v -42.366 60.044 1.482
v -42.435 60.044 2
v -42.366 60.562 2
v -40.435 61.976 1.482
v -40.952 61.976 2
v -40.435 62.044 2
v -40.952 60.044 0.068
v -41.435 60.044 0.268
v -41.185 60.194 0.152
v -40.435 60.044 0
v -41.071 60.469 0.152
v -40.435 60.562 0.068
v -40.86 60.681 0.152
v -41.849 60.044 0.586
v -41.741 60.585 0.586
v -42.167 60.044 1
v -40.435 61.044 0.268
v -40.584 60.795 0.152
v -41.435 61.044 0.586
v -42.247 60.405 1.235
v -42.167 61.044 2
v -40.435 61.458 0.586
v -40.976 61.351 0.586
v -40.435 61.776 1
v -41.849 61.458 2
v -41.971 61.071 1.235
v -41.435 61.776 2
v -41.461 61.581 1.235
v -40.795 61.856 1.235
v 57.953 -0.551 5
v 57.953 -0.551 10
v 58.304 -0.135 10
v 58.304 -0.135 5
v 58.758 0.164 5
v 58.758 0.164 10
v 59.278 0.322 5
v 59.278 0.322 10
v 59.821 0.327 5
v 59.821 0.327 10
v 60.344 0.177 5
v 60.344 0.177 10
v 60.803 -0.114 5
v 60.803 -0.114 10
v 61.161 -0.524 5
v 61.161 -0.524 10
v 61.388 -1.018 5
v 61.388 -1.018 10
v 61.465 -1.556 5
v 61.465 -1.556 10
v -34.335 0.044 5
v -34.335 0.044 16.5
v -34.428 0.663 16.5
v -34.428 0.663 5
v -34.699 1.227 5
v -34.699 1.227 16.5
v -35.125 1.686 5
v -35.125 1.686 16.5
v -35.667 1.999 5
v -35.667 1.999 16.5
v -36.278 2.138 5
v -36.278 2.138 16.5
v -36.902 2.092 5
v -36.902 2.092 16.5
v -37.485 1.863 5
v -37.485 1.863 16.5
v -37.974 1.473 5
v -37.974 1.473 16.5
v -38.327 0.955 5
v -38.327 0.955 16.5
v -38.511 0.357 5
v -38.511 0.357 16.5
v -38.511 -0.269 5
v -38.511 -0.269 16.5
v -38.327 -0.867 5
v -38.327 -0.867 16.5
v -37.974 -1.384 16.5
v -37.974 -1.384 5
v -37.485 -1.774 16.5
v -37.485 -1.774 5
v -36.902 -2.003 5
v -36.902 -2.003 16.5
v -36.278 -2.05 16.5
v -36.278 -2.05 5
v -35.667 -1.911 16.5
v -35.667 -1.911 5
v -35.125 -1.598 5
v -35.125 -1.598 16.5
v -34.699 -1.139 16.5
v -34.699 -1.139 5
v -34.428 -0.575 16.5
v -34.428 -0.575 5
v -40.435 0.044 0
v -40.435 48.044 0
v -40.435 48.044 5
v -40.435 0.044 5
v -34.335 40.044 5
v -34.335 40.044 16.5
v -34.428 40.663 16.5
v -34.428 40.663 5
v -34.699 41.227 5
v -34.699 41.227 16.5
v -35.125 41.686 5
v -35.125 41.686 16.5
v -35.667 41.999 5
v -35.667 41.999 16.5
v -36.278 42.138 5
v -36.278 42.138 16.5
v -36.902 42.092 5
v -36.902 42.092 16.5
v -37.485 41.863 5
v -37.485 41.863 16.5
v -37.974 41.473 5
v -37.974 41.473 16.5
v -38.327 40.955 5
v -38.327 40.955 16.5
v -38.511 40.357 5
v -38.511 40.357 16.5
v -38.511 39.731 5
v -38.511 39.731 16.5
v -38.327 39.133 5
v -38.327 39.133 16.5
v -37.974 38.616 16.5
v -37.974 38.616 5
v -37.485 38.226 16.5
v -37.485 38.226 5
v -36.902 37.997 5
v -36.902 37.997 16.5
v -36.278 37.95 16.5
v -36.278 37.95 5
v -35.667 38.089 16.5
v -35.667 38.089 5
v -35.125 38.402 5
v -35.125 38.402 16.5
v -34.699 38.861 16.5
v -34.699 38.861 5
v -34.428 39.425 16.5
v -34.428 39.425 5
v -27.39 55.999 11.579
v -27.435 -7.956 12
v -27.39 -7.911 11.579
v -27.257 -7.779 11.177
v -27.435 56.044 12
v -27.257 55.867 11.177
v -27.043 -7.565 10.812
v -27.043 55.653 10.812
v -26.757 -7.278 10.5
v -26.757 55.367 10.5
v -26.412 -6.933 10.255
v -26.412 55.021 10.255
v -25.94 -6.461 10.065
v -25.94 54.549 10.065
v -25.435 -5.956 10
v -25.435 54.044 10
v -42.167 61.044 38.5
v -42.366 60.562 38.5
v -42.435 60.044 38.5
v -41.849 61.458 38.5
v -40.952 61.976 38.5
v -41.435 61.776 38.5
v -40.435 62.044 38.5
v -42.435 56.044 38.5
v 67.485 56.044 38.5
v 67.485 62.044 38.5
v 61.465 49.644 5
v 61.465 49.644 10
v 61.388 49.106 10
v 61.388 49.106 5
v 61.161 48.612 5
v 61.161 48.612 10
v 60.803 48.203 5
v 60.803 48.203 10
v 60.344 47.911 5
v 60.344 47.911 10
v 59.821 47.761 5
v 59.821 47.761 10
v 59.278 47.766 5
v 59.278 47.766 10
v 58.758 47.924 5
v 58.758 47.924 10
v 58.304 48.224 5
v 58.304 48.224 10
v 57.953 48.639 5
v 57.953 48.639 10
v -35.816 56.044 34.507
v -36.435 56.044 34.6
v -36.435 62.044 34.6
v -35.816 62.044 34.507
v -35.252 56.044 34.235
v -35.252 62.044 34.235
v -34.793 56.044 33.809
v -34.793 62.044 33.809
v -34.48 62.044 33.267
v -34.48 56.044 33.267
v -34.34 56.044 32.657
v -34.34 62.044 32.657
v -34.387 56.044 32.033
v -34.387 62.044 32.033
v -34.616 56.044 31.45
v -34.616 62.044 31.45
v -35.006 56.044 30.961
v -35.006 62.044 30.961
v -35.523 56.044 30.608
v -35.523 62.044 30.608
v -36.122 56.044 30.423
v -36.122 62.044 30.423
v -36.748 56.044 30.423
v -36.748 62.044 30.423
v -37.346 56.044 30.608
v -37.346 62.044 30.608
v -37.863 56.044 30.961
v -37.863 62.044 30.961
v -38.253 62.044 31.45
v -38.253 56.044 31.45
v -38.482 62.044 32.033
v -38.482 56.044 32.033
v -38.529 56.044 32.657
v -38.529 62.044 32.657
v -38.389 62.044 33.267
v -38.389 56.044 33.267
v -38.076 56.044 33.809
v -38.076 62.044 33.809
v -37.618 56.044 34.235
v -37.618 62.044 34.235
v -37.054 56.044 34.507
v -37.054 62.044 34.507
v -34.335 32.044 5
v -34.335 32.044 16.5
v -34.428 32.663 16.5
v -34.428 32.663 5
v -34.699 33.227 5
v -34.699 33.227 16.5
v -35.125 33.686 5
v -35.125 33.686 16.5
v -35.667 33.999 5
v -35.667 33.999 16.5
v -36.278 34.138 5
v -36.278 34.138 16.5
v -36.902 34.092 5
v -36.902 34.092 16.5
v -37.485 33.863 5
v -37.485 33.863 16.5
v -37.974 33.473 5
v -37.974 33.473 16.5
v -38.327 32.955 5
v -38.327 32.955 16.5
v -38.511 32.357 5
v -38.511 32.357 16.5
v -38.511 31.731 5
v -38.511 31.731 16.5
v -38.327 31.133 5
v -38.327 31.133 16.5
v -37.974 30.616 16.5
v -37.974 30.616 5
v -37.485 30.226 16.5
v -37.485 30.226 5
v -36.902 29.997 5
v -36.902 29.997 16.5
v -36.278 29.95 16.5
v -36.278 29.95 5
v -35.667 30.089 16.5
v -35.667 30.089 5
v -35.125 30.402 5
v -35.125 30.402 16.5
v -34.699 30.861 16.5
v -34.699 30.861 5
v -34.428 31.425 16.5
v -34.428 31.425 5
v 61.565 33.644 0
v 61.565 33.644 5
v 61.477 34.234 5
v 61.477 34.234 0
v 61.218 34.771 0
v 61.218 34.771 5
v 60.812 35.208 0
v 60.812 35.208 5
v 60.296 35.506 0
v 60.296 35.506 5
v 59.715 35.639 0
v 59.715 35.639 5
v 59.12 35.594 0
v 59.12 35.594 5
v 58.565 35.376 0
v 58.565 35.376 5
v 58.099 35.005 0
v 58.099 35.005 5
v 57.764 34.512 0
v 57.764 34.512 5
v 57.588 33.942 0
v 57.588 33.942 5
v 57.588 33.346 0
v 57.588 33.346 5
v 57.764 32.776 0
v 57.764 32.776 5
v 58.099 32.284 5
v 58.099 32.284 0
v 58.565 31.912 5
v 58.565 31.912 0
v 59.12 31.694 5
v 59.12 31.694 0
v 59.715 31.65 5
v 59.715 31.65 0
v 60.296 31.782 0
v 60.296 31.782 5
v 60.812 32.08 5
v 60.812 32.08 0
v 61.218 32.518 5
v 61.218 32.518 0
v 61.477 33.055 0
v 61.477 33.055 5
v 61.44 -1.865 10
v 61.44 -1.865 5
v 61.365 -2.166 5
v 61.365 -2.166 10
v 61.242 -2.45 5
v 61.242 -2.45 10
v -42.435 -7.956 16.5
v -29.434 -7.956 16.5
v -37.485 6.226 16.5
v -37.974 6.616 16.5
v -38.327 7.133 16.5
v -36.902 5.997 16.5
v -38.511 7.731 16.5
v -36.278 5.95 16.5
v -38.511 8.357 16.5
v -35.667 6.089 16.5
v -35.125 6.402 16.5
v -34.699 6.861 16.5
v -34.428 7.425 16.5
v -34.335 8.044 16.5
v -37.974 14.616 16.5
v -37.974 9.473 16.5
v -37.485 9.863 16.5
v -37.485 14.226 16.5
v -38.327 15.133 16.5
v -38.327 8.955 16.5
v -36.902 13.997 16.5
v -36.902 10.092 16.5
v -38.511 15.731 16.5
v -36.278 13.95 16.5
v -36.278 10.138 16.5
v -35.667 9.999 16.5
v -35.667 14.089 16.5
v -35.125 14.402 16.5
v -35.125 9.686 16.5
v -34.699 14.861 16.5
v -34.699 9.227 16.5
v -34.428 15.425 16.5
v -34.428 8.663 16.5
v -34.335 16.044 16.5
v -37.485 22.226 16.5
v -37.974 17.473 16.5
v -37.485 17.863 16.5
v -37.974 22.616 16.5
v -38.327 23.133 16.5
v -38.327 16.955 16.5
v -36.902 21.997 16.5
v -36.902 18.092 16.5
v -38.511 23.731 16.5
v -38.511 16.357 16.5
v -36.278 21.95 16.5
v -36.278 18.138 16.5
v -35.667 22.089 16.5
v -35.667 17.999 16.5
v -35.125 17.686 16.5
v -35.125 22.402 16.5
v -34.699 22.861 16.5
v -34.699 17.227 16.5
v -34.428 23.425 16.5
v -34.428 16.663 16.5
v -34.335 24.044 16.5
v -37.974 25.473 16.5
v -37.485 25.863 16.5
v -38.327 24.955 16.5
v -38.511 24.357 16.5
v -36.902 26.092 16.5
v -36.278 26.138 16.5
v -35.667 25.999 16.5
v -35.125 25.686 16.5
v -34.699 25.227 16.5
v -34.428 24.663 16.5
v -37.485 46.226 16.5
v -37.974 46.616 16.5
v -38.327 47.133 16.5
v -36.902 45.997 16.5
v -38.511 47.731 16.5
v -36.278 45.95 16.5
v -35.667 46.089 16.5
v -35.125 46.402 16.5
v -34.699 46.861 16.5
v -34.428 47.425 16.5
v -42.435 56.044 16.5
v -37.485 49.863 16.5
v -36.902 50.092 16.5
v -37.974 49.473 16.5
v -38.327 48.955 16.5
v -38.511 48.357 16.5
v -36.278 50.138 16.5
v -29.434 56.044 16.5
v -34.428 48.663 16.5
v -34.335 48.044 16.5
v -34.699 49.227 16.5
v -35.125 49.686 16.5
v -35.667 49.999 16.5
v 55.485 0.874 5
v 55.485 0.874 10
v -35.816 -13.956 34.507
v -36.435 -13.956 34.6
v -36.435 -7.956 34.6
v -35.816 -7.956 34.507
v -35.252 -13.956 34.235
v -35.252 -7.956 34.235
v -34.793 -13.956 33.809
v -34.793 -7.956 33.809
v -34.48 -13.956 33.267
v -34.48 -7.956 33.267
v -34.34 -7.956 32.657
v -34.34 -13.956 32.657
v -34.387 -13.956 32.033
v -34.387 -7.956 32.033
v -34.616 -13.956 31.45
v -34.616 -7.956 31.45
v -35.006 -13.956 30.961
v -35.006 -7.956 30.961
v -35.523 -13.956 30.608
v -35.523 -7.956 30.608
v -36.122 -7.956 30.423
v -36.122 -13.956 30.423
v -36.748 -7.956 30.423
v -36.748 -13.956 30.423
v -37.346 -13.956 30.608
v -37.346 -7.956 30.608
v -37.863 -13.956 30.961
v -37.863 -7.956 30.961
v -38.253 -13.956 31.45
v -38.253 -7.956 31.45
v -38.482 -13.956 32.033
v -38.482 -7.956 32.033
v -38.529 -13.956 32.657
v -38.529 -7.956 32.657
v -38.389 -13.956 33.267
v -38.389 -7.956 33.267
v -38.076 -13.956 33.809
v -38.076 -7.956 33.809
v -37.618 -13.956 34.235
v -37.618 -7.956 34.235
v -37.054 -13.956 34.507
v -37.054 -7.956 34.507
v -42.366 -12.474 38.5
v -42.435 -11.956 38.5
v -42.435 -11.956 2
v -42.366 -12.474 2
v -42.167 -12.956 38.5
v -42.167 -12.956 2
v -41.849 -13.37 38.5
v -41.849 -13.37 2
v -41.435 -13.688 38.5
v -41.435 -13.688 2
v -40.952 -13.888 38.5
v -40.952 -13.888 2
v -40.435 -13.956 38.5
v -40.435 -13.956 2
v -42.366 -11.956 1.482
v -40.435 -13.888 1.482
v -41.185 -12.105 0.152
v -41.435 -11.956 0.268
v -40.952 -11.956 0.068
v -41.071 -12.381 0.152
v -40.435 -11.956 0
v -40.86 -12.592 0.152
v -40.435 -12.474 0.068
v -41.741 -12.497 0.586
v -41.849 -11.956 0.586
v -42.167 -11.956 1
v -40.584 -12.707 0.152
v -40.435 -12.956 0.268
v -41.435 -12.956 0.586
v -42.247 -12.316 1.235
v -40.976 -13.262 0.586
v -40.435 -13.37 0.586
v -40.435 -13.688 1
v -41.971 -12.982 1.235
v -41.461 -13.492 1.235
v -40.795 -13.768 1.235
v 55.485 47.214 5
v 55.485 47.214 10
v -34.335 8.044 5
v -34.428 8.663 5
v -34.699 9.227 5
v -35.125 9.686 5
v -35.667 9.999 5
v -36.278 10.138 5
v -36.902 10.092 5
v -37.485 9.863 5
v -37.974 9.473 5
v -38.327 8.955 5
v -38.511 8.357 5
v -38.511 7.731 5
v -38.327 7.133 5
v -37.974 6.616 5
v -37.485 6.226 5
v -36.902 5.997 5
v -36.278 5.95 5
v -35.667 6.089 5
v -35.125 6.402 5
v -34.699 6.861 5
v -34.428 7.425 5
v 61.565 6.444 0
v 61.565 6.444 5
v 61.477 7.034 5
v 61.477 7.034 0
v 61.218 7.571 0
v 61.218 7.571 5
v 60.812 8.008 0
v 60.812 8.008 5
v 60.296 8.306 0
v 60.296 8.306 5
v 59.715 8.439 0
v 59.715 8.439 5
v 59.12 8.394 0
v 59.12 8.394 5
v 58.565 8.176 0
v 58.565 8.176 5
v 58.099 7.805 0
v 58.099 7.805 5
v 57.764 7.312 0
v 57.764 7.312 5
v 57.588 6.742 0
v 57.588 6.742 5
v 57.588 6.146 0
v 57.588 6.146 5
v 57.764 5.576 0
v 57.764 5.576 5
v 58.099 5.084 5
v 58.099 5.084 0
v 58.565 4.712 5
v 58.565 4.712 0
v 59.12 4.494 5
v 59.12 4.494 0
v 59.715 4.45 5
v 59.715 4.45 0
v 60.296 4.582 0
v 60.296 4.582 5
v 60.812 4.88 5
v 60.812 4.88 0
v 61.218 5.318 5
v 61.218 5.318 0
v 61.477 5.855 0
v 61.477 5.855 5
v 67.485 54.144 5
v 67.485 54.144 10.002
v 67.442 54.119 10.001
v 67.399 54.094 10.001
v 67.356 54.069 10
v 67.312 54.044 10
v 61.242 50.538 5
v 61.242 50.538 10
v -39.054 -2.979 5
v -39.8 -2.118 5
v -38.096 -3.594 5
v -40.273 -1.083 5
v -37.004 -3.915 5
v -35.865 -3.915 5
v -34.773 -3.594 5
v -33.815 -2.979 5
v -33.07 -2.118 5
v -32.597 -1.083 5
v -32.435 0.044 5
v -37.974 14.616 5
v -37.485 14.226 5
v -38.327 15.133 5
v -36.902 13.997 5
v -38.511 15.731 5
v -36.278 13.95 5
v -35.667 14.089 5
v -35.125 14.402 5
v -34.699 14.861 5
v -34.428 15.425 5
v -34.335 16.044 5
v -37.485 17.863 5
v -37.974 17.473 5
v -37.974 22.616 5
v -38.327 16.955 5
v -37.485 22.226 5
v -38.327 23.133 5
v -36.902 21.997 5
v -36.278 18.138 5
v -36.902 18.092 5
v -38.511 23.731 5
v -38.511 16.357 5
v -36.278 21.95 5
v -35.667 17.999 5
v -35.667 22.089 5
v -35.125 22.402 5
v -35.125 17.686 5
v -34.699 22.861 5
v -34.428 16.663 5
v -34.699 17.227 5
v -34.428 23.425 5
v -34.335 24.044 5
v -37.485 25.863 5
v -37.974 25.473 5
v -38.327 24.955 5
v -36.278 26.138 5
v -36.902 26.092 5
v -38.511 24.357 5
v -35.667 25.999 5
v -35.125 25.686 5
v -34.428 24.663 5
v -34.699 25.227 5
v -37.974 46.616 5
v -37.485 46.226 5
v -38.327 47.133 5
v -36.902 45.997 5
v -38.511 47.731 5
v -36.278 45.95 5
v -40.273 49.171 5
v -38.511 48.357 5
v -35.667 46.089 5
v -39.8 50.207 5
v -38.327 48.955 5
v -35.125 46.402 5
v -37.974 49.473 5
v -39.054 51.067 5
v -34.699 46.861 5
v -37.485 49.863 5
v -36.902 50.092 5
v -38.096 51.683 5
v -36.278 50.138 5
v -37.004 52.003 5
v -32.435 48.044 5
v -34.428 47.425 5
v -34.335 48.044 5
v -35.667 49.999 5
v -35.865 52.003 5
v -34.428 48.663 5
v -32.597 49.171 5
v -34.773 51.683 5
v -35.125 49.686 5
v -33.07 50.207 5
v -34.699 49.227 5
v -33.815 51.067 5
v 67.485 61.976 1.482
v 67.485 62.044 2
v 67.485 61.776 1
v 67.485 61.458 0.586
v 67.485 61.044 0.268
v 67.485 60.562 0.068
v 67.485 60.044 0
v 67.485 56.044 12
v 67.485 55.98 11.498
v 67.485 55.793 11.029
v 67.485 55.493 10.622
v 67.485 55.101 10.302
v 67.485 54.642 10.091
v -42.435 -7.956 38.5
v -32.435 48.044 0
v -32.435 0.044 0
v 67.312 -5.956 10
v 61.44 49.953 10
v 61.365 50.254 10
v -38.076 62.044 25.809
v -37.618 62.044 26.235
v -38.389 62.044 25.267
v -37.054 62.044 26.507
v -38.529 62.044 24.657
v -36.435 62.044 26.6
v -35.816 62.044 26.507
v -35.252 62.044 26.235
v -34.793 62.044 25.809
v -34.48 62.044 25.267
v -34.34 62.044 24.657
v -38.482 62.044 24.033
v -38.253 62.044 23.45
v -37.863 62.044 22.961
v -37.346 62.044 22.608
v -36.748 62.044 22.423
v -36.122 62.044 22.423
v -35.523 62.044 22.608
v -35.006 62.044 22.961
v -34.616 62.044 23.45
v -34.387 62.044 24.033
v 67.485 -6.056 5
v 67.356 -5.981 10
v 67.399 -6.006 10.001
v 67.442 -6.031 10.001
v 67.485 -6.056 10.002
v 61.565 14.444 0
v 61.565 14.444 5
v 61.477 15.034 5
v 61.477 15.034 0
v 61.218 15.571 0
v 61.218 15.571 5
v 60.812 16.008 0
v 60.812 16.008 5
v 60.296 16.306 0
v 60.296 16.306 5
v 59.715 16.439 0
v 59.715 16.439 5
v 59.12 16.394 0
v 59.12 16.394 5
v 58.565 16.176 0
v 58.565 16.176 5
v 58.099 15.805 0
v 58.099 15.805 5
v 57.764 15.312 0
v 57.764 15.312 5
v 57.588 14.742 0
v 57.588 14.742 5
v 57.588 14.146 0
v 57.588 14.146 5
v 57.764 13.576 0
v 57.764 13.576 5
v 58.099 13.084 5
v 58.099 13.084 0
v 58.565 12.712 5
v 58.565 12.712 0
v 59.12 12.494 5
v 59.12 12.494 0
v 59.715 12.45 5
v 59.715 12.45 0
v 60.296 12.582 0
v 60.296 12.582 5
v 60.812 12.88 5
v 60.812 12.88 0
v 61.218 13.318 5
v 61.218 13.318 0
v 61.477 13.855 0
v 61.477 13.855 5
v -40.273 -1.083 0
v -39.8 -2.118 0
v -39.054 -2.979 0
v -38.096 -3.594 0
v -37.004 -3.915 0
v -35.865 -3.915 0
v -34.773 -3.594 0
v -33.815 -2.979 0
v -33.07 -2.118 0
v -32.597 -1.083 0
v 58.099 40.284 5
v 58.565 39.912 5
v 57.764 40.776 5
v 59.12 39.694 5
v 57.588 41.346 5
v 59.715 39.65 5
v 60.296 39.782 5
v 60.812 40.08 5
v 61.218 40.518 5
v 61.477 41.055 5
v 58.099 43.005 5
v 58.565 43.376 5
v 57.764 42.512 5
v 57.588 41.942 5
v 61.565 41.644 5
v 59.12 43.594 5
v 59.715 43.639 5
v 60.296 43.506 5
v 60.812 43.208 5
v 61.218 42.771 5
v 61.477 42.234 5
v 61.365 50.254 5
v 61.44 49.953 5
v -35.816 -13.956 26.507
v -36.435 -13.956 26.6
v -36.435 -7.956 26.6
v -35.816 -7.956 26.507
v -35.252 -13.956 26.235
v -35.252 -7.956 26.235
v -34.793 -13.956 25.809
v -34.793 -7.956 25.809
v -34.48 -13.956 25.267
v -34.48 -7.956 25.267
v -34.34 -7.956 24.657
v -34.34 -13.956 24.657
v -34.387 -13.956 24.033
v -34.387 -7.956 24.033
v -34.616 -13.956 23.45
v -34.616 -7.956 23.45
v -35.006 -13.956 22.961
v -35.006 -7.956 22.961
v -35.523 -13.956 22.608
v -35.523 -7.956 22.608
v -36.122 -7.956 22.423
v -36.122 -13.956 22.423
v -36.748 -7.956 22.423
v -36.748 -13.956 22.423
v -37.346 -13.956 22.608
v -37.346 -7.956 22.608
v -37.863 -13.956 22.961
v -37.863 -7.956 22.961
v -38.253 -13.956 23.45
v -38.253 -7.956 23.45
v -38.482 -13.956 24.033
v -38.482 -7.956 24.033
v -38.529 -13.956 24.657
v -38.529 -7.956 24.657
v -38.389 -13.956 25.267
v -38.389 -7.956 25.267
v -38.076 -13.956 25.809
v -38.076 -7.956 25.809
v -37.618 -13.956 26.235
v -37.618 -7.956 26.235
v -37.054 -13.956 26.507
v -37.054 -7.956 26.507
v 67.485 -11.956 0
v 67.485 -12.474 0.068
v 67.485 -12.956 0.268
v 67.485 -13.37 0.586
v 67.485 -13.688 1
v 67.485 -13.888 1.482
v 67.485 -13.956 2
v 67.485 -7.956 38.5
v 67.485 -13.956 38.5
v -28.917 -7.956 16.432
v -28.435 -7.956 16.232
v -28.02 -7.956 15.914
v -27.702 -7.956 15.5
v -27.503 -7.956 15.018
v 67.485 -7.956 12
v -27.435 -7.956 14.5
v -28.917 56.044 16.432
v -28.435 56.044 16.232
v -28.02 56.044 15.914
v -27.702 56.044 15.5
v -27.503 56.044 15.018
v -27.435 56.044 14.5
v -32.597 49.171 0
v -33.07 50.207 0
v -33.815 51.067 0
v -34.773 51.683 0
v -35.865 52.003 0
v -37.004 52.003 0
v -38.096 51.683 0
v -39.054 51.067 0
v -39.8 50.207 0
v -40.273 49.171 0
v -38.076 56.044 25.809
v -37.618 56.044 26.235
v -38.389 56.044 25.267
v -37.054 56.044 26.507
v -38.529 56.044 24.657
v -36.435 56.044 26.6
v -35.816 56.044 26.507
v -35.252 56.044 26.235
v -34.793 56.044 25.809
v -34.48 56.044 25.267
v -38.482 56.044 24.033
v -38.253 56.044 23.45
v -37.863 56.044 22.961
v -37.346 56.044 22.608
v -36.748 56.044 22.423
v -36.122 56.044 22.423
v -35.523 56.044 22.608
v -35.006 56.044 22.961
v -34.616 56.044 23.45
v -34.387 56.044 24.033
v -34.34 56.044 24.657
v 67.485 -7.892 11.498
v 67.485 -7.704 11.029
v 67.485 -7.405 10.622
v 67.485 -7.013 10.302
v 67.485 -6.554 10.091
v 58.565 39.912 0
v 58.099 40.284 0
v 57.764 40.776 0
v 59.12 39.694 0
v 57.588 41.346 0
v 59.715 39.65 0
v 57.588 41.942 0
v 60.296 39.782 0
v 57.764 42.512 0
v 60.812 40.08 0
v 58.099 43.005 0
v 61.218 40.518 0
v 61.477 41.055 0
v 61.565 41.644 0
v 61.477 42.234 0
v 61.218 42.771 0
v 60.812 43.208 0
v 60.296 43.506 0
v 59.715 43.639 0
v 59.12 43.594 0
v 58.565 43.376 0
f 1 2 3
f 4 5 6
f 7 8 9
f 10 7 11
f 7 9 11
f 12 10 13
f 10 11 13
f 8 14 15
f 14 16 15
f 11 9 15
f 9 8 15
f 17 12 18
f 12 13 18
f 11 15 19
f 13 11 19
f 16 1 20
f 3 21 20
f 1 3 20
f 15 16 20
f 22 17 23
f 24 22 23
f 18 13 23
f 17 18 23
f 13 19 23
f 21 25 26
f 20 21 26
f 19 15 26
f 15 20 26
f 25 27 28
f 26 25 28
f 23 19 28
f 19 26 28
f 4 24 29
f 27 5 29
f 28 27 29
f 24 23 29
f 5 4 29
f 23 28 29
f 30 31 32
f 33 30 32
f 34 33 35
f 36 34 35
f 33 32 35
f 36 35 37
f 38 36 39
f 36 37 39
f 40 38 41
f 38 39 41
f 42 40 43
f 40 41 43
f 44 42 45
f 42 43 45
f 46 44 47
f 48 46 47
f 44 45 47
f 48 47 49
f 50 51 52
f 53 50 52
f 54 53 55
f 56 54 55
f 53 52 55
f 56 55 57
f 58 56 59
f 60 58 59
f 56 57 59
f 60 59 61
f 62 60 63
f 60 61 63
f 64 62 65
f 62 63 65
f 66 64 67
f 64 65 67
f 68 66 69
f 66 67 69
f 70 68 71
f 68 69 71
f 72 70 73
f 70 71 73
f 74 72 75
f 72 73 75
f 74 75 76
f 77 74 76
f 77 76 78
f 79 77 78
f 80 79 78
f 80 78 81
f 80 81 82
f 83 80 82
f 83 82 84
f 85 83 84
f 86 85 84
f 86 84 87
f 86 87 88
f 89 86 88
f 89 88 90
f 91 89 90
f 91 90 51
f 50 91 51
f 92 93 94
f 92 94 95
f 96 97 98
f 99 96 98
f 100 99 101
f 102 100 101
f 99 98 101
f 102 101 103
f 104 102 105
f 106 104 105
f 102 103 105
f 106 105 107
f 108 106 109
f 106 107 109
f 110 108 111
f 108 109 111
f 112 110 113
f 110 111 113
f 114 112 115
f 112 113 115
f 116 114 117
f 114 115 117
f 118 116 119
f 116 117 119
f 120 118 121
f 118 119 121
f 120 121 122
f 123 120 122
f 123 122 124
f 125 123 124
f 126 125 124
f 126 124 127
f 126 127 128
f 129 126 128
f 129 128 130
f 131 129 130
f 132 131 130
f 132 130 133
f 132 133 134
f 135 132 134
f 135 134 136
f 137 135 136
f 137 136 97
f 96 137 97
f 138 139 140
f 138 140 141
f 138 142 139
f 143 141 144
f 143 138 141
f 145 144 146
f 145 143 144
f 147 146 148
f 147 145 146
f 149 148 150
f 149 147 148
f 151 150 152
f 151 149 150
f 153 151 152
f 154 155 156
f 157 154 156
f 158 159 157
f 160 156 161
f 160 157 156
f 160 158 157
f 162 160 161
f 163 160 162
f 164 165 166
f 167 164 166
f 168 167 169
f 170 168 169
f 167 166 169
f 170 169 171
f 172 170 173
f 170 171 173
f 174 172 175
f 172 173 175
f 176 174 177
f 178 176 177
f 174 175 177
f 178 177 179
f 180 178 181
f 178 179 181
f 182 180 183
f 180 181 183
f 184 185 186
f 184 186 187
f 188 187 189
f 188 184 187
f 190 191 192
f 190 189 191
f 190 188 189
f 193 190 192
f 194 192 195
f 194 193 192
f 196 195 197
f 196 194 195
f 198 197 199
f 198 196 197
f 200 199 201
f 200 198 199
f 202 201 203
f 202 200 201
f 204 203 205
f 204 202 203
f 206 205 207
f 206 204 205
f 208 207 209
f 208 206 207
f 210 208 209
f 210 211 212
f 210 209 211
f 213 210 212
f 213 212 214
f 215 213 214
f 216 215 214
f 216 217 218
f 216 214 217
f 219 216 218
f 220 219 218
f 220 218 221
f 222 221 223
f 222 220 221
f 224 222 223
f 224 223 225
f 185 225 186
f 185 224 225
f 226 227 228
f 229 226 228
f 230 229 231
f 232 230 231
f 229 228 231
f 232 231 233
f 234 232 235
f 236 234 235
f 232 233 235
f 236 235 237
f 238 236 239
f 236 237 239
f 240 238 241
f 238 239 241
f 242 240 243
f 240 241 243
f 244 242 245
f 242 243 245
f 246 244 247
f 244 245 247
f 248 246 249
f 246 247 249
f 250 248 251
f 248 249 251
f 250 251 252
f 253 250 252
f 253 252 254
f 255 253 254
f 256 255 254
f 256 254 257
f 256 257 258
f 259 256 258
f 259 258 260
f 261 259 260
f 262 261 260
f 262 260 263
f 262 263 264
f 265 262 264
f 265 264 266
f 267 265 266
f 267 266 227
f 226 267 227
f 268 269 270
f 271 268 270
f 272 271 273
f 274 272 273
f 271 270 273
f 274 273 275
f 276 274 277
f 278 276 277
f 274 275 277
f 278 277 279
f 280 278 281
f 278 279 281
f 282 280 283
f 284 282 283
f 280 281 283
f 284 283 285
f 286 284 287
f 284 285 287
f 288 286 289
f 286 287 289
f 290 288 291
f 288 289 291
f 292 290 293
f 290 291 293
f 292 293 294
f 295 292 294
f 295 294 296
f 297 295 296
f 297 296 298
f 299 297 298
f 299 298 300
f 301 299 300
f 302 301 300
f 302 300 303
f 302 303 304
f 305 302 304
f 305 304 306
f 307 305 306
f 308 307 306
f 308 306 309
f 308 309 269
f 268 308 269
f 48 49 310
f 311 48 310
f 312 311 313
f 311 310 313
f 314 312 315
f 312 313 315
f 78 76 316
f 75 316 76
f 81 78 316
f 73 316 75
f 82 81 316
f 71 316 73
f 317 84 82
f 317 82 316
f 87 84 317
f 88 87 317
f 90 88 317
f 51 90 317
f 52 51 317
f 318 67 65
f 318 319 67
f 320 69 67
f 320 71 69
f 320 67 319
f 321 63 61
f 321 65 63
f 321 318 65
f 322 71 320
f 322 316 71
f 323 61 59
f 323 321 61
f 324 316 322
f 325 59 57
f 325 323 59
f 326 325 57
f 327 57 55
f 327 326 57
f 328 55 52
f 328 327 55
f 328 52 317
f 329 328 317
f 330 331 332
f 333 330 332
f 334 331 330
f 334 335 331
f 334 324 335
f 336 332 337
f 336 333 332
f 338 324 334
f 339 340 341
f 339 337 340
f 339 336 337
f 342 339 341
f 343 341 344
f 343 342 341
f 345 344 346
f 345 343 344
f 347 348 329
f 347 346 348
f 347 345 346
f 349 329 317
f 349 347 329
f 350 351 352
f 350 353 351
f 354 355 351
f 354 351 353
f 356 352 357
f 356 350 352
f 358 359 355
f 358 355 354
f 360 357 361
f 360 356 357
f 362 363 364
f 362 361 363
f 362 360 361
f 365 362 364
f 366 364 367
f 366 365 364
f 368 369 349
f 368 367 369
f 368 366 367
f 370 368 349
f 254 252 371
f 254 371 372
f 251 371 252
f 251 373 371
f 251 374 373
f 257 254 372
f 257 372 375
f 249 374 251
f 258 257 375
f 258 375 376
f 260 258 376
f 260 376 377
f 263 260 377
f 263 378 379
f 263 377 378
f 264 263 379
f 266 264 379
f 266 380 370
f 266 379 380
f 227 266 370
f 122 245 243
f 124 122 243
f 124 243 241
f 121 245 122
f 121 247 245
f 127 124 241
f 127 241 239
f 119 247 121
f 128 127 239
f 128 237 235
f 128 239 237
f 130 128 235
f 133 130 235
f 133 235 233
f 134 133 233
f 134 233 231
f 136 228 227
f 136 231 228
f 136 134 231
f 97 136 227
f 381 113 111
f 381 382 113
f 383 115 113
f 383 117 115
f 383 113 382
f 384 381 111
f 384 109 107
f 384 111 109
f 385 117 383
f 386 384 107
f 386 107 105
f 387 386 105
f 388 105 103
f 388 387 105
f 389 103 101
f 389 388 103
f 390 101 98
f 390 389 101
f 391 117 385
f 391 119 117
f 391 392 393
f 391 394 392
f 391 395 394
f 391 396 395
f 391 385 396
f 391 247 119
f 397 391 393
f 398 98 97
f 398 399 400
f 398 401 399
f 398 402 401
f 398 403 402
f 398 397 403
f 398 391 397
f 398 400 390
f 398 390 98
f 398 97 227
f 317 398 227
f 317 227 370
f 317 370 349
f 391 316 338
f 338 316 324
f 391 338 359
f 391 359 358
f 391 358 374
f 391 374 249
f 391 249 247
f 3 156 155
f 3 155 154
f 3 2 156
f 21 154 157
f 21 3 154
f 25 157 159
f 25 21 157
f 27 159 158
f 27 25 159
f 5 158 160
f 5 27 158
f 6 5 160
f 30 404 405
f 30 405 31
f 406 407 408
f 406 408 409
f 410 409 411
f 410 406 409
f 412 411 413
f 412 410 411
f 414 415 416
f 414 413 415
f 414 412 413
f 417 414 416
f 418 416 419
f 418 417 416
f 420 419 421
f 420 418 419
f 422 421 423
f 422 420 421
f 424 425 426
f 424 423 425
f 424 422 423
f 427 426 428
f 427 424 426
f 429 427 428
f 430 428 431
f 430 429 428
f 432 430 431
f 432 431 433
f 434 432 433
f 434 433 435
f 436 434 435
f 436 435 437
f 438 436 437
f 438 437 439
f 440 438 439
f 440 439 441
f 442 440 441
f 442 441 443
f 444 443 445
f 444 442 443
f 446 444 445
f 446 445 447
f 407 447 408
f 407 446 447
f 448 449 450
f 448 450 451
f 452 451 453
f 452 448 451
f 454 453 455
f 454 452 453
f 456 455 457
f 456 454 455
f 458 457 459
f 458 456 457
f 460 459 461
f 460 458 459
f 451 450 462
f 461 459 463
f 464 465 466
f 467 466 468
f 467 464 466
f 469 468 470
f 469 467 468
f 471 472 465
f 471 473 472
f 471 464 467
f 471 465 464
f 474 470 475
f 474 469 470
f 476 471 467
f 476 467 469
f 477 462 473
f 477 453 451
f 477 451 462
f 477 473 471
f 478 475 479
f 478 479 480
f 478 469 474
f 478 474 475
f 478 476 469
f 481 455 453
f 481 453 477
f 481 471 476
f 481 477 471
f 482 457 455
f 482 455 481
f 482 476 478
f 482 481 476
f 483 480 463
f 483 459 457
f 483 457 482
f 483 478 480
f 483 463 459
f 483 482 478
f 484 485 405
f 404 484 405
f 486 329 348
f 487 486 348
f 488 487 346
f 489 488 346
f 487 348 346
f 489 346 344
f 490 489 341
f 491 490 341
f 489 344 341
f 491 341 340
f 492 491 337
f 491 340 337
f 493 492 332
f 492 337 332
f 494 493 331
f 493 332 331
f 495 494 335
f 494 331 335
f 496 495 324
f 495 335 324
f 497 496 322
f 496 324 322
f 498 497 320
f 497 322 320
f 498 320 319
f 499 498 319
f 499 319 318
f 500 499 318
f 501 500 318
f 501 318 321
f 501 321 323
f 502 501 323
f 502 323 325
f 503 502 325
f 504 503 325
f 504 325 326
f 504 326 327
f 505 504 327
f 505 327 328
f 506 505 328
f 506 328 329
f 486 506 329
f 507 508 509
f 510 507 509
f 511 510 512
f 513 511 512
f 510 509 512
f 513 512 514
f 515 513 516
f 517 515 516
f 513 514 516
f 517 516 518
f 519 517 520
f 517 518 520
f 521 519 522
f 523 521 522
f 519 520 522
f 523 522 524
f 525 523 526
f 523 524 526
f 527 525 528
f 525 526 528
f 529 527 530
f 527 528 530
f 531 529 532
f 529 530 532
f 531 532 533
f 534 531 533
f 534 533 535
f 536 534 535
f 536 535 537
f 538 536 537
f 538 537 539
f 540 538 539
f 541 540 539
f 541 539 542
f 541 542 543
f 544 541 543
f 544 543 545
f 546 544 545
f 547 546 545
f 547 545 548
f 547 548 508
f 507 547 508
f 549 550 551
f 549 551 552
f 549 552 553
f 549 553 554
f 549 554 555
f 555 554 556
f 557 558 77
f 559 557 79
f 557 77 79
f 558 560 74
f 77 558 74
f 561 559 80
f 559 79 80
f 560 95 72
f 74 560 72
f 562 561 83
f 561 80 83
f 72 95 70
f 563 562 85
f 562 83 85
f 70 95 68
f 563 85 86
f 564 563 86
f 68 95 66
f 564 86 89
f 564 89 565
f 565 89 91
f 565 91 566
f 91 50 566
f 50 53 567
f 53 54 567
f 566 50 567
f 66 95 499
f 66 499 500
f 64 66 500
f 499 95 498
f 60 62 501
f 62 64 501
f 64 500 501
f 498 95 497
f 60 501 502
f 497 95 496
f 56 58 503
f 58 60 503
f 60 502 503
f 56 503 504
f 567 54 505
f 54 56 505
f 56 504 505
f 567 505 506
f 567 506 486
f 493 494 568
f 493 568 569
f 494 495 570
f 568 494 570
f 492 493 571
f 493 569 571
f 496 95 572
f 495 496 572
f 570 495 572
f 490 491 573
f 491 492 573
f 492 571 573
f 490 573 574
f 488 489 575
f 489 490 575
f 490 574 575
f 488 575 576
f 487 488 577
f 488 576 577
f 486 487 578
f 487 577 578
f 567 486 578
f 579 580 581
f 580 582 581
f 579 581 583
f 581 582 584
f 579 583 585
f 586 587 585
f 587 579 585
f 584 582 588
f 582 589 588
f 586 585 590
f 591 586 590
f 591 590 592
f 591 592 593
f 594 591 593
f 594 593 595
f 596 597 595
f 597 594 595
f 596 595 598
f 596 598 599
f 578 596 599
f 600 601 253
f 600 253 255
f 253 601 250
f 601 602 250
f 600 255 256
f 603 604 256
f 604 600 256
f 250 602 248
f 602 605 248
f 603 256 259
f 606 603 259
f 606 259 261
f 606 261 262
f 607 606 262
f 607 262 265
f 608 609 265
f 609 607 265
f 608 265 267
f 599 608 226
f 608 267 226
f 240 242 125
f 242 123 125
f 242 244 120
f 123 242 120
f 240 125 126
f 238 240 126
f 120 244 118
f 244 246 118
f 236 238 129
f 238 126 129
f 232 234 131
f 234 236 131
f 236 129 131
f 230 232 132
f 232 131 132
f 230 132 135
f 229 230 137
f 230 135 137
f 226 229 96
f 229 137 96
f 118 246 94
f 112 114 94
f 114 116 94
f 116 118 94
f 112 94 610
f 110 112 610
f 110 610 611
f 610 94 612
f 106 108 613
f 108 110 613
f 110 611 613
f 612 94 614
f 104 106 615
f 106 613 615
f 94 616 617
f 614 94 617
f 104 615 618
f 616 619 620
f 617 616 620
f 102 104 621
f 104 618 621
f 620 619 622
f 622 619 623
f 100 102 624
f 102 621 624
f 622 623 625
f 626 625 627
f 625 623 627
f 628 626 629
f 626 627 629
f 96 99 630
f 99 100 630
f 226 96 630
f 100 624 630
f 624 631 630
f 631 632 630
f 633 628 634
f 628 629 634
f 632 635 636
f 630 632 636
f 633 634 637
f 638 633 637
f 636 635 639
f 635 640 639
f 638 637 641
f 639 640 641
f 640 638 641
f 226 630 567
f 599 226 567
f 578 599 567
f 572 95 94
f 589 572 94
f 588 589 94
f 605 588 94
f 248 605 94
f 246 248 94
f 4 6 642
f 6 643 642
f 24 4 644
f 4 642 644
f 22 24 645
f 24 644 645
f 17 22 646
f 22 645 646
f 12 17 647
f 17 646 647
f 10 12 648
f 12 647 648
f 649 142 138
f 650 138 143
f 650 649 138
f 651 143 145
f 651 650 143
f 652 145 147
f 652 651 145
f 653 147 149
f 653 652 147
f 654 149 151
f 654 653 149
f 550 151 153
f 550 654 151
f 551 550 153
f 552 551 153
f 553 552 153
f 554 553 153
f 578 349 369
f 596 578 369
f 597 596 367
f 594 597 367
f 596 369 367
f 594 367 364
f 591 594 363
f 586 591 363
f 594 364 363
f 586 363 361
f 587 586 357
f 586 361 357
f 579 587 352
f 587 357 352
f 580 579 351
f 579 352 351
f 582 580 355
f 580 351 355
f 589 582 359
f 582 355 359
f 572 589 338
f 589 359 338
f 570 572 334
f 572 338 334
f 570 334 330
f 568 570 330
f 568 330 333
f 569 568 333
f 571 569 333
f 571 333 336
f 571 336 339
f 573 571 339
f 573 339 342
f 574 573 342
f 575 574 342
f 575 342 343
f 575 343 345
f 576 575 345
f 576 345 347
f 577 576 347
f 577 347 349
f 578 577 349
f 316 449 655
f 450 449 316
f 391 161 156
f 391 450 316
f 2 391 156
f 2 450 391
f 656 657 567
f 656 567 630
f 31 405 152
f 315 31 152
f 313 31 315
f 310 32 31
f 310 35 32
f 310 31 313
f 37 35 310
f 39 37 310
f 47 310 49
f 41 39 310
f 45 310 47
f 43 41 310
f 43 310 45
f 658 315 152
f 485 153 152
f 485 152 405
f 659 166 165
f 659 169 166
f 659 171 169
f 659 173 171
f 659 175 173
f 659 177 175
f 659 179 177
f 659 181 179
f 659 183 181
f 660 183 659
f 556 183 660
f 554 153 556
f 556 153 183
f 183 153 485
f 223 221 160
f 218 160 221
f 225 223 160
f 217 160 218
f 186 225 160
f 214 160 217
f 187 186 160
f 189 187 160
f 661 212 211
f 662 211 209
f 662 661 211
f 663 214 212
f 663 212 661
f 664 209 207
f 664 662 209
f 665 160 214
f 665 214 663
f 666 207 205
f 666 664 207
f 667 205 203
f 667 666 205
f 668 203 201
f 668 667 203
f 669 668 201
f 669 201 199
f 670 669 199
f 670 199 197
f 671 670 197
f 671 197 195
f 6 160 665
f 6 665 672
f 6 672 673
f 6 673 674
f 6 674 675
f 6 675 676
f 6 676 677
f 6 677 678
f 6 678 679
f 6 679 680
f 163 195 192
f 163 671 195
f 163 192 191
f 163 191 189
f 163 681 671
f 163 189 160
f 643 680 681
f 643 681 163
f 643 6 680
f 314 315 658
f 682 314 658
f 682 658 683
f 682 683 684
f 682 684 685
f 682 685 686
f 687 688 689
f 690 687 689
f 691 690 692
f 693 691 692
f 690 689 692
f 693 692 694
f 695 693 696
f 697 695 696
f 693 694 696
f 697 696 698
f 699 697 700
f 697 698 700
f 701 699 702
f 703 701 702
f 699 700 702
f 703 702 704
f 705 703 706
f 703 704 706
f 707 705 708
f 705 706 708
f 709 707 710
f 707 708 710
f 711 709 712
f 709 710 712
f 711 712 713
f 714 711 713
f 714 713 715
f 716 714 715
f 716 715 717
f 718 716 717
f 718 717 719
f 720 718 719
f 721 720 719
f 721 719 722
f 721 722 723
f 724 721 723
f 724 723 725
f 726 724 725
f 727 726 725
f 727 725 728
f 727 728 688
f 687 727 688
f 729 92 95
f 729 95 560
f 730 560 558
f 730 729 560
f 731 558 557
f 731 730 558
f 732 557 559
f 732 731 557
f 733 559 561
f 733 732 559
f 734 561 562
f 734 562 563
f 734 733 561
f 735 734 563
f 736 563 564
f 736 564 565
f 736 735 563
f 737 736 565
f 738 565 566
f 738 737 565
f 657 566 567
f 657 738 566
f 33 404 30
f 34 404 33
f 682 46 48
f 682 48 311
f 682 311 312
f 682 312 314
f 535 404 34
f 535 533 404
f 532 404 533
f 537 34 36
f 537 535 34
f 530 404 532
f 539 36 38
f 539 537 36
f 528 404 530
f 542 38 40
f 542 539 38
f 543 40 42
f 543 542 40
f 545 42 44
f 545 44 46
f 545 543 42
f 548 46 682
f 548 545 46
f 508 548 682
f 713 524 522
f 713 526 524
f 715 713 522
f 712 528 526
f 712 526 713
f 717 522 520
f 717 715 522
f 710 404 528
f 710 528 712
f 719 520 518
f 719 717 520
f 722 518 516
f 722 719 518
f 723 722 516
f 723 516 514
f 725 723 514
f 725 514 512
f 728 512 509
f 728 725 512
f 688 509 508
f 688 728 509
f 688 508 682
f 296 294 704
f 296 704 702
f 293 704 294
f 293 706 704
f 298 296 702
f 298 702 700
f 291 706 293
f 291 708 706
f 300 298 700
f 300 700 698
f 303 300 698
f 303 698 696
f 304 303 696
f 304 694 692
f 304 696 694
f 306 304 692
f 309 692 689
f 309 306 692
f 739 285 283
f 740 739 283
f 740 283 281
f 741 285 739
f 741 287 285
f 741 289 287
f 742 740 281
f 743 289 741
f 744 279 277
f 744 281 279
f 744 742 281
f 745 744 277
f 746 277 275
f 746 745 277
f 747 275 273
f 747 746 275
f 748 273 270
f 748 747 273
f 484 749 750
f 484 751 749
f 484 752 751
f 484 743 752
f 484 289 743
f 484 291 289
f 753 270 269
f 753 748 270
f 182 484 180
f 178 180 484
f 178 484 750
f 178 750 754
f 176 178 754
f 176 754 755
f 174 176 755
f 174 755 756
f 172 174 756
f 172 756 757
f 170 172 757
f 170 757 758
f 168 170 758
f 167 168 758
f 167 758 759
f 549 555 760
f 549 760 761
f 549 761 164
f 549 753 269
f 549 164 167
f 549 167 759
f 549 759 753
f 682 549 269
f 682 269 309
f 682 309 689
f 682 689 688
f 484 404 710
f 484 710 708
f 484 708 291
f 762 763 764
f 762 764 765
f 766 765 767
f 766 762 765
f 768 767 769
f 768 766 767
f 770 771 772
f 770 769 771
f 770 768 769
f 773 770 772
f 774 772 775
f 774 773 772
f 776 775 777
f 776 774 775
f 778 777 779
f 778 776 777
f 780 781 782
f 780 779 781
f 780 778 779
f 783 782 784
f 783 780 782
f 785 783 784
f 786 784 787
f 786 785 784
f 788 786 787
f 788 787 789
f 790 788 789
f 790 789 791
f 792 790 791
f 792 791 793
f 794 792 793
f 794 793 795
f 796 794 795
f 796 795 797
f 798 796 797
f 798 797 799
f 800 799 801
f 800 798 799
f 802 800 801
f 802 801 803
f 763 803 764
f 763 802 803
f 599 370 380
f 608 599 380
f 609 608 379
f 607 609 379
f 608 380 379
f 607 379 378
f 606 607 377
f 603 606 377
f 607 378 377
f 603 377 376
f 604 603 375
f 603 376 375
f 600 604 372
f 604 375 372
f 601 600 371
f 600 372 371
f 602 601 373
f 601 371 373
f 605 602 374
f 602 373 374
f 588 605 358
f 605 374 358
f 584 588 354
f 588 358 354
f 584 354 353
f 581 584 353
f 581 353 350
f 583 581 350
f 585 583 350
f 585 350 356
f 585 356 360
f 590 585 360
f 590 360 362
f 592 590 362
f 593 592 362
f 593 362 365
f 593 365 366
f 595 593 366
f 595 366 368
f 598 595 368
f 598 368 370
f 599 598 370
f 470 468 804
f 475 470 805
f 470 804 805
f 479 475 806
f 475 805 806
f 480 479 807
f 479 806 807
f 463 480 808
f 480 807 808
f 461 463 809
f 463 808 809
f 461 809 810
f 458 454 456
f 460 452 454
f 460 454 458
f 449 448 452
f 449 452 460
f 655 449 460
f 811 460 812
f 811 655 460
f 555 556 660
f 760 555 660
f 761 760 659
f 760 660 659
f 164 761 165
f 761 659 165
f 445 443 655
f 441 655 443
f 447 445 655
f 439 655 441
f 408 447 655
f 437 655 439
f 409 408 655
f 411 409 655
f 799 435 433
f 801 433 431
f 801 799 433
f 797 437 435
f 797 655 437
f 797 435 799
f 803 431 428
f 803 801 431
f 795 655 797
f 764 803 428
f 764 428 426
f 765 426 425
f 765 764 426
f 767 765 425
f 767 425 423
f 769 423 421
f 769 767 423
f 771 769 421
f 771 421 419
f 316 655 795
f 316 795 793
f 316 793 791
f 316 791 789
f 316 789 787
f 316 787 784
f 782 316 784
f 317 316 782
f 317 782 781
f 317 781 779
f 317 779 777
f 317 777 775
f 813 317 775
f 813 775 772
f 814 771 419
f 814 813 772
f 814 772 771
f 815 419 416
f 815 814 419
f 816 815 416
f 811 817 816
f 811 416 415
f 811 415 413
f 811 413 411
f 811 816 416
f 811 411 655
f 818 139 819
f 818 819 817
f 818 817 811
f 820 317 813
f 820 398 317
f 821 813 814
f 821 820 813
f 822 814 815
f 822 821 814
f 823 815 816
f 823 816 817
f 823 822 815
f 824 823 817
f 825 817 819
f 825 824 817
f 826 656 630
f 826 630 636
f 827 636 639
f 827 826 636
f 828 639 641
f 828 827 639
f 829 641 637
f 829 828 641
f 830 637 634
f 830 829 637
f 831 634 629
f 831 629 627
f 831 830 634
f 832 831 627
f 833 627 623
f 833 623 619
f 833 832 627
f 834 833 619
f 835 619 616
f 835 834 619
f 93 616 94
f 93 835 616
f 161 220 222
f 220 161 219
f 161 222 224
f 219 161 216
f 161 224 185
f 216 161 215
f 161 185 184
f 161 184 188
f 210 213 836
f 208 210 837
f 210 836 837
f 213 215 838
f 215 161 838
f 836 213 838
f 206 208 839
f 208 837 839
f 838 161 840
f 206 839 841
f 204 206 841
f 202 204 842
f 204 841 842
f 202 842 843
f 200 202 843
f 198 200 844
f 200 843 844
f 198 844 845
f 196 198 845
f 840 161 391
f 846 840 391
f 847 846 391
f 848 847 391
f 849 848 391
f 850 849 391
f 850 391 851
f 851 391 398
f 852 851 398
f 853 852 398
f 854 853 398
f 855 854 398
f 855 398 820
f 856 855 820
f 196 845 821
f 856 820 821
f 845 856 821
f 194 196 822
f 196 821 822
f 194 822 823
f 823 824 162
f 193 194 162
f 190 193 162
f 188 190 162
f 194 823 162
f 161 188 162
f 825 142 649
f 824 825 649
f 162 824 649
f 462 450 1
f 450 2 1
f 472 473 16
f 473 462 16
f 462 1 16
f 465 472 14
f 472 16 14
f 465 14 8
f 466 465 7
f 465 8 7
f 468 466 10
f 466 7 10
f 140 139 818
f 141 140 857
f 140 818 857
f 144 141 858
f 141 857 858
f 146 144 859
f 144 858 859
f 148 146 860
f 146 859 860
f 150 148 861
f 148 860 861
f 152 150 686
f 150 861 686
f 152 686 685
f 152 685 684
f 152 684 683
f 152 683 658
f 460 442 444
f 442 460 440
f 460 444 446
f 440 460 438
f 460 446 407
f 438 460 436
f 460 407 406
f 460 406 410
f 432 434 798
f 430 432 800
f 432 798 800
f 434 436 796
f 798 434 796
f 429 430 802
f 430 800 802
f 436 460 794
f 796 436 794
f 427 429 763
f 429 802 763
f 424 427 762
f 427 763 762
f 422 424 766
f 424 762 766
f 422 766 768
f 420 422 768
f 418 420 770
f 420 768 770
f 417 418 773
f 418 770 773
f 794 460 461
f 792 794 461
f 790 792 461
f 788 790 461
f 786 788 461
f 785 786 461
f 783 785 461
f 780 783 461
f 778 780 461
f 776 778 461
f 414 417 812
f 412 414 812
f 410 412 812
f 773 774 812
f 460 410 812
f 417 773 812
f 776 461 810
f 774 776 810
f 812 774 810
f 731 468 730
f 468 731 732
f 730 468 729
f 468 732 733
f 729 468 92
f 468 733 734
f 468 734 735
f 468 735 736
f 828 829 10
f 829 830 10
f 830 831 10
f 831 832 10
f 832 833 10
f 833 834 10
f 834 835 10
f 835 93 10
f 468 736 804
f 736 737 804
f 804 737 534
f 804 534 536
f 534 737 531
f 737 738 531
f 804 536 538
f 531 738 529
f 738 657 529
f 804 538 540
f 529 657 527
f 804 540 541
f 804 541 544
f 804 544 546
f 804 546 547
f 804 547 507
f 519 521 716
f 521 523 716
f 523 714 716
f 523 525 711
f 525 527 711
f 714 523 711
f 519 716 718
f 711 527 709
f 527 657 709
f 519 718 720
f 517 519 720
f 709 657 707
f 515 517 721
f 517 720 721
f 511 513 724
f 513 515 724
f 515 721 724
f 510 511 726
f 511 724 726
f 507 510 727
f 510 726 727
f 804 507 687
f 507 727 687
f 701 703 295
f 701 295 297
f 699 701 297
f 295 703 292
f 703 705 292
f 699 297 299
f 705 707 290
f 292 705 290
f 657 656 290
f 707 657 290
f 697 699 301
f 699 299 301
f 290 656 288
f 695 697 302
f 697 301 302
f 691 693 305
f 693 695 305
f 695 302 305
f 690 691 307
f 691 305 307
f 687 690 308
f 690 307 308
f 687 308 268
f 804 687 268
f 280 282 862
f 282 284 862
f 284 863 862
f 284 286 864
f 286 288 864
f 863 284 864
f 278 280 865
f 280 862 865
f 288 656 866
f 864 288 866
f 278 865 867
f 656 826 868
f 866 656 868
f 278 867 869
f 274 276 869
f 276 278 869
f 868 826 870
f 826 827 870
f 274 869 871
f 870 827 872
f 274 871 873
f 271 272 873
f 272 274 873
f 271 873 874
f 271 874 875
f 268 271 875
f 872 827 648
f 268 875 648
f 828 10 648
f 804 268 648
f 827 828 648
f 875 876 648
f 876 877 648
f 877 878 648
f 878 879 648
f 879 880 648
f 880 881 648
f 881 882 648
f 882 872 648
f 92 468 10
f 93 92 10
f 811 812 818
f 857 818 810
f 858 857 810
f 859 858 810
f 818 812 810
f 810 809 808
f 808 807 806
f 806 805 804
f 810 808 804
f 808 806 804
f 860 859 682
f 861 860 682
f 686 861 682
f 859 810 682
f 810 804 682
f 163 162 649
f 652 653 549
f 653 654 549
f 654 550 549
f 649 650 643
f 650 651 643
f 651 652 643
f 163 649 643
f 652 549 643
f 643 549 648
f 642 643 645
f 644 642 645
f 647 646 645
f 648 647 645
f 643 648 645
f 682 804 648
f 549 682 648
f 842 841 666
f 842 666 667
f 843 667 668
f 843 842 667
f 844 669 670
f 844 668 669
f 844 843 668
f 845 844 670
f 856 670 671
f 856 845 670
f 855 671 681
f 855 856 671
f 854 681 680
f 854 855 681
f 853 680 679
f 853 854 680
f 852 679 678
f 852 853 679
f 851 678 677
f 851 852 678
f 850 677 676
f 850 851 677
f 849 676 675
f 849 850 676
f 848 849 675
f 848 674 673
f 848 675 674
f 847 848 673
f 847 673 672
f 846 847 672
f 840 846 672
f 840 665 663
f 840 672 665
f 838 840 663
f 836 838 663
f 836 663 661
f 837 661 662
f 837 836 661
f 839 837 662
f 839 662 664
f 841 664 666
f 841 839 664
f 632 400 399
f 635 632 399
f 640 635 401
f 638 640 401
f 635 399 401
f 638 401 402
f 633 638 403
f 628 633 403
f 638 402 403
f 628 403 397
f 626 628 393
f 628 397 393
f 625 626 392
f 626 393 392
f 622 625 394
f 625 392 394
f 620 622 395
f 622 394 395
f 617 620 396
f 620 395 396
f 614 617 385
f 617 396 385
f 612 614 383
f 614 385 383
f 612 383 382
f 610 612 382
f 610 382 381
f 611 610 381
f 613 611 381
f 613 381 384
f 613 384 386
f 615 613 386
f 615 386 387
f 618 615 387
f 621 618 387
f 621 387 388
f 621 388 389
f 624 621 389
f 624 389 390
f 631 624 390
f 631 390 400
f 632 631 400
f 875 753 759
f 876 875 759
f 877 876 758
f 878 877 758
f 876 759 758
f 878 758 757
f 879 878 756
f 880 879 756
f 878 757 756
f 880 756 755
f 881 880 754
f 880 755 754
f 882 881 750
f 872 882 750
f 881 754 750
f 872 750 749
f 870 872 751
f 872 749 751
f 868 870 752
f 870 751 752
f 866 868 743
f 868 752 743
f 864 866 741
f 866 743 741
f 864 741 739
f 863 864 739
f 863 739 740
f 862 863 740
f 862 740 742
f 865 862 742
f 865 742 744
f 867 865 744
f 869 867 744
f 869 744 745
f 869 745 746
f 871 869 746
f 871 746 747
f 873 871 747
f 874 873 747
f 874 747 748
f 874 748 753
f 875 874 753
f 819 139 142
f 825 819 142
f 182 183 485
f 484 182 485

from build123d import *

# Parameters (mm, degrees)
SKETCH_2_W               = 109.92
SKETCH_2_H               = 76
EXTRUDE_1_DEPTH          = 10
CUT_EXTRUDE_1_DEPTH      = 5
SKETCH_4_R               = 2
CUT_EXTRUDE_2_DEPTH      = 92.808295873
SKETCH_5_W               = 109.92
SKETCH_5_H               = 6
EXTRUDE_2_DEPTH          = 28.5
SKETCH_6_W               = 15
SKETCH_6_H               = 64
EXTRUDE_3_DEPTH          = 6.5
CUT_EXTRUDE_3_DEPTH      = 105.577891178
CUT_EXTRUDE_3_DEPTH_BACK = 105.577891178
SKETCH_7_R               = 2.1
SKETCH_9_R               = 2.1
CUT_EXTRUDE_4_DEPTH      = 95.274934055
CUT_EXTRUDE_5_DEPTH      = 5
FILLET_1_R               = 2


with BuildPart() as part:
    # 草圖2 → 填料-伸長1 (new body)
    with BuildSketch(Plane.XY):
        with Locations((12.52544527, 24.044160626)):
            Rectangle(SKETCH_2_W, SKETCH_2_H)
    extrude(amount=EXTRUDE_1_DEPTH)

    # 草圖3 → 除料-伸長1 (cut)
    with BuildSketch(Plane.XY.offset(10)):
        with BuildLine():
            Line((67.48544527, -6.055839374), (67.48544527, 54.144160626))
            Line((67.48544527, 54.144160626), (61.24181631, 50.538464901))
            ThreePointArc((61.24181631, 50.538464901), (61.408690367, 50.105080914), (61.46544527, 49.644160626))
            ThreePointArc((61.46544527, 49.644160626), (60.088104264, 47.81746208), (57.95299519, 48.639170705))
            Line((57.95299519, 48.639170705), (55.48544527, 47.214160626))
            Line((55.48544527, 47.214160626), (55.48544527, 0.874160626))
            Line((55.48544527, 0.874160626), (57.95299519, -0.550849453))
            ThreePointArc((57.95299519, -0.550849453), (60.088104264, 0.270859171), (61.46544527, -1.555839374))
            ThreePointArc((61.46544527, -1.555839374), (61.408690367, -2.016759663), (61.24181631, -2.45014365))
            Line((61.24181631, -2.45014365), (67.48544527, -6.055839374))
        make_face()
    extrude(amount=-CUT_EXTRUDE_1_DEPTH, mode=Mode.SUBTRACT)

    # 草圖4 → 除料-伸長2 (cut, through all)
    with BuildSketch(Plane.XY.offset(5)):
        with Locations((59.56544527, 41.644160626)):
            Circle(SKETCH_4_R)
        with Locations((59.56544527, 33.644160626)):
            Circle(SKETCH_4_R)
        with Locations((59.56544527, 6.444160626)):
            Circle(SKETCH_4_R)
        with Locations((59.56544527, 14.444160626)):
            Circle(SKETCH_4_R)
    extrude(amount=-CUT_EXTRUDE_2_DEPTH, mode=Mode.SUBTRACT)

    # 草圖5 → 填料-伸長2 (add)
    with BuildSketch(Plane.XY.offset(10)):
        with Locations((12.52544527, -10.955839374)):
            Rectangle(SKETCH_5_W, SKETCH_5_H)
        with Locations((12.52544527, 59.044160626)):
            Rectangle(SKETCH_5_W, SKETCH_5_H)
    extrude(amount=EXTRUDE_2_DEPTH)

    # 草圖6 → 填料-伸長3 (add)
    with BuildSketch(Plane.XY.offset(10)):
        with Locations((-34.93455473, 24.044160626)):
            Rectangle(SKETCH_6_W, SKETCH_6_H)
    extrude(amount=EXTRUDE_3_DEPTH)

    # 草圖7 → 除料-伸長3 (cut, two sides: drawn at the far end of the back side and taken through both)
    with BuildSketch(Plane(origin=(0, -7.955839374, 0), x_dir=(1, 0, 0), z_dir=(0, 1, 0)).offset(-CUT_EXTRUDE_3_DEPTH_BACK)):
        with Locations(Location((-36.43455473, -24.5, 0), (0, 0, 270))):
            Circle(SKETCH_7_R)
        with Locations(Location((-36.43455473, -32.5, 0), (0, 0, 270))):
            Circle(SKETCH_7_R)
    extrude(amount=CUT_EXTRUDE_3_DEPTH + CUT_EXTRUDE_3_DEPTH_BACK, mode=Mode.SUBTRACT)

    # 草圖9 → 除料-伸長4 (cut, through all)
    with BuildSketch(Plane.XY.offset(16.5)):
        with Locations((-36.43455473, 0.044160626)):
            Circle(SKETCH_9_R)
        with Locations((-36.43455473, 8.044160626)):
            Circle(SKETCH_9_R)
        with Locations((-36.43455473, 16.044160626)):
            Circle(SKETCH_9_R)
        with Locations((-36.43455473, 24.044160626)):
            Circle(SKETCH_9_R)
        with Locations((-36.43455473, 32.044160626)):
            Circle(SKETCH_9_R)
        with Locations((-36.43455473, 40.044160626)):
            Circle(SKETCH_9_R)
        with Locations((-36.43455473, 48.044160626)):
            Circle(SKETCH_9_R)
    extrude(amount=-CUT_EXTRUDE_4_DEPTH, mode=Mode.SUBTRACT)

    # 草圖10 → 除料-伸長5 (cut)
    with BuildSketch(Plane(origin=(0, 0, 0), x_dir=(-1, 0, 0), z_dir=(0, 0, -1))):
        with BuildLine():
            Line((32.43455473, 0.044160626), (32.43455473, 48.044160626))
            ThreePointArc((32.43455473, 48.044160626), (36.43455473, 52.044160626), (40.43455473, 48.044160626))
            Line((40.43455473, 48.044160626), (40.43455473, 0.044160626))
            ThreePointArc((40.43455473, 0.044160626), (36.43455473, -3.955839374), (32.43455473, 0.044160626))
        make_face()
    extrude(amount=-CUT_EXTRUDE_5_DEPTH, mode=Mode.SUBTRACT)

    # 圓角1
    fillet_1_edges = [part.edges().sort_by_distance(p)[0] for p in [
        (-27.43455473, 24.044160626, 16.5),
        (-27.43455473, 24.044160626, 10),
        (20.02544527, 56.044160626, 10),
        (20.02544527, -7.955839374, 10),
        (-42.43455473, 62.044160626, 19.25),
        (-42.43455473, -13.955839374, 19.25),
        (-42.43455473, 24.044160626, 0),
        (12.52544527, -13.955839374, 0),
        (12.52544527, 62.044160626, 0),
    ]]
    fillet(fillet_1_edges, radius=FILLET_1_R - 0.0001)  # a hair under: the kernel refuses the full size


solid = part.part
